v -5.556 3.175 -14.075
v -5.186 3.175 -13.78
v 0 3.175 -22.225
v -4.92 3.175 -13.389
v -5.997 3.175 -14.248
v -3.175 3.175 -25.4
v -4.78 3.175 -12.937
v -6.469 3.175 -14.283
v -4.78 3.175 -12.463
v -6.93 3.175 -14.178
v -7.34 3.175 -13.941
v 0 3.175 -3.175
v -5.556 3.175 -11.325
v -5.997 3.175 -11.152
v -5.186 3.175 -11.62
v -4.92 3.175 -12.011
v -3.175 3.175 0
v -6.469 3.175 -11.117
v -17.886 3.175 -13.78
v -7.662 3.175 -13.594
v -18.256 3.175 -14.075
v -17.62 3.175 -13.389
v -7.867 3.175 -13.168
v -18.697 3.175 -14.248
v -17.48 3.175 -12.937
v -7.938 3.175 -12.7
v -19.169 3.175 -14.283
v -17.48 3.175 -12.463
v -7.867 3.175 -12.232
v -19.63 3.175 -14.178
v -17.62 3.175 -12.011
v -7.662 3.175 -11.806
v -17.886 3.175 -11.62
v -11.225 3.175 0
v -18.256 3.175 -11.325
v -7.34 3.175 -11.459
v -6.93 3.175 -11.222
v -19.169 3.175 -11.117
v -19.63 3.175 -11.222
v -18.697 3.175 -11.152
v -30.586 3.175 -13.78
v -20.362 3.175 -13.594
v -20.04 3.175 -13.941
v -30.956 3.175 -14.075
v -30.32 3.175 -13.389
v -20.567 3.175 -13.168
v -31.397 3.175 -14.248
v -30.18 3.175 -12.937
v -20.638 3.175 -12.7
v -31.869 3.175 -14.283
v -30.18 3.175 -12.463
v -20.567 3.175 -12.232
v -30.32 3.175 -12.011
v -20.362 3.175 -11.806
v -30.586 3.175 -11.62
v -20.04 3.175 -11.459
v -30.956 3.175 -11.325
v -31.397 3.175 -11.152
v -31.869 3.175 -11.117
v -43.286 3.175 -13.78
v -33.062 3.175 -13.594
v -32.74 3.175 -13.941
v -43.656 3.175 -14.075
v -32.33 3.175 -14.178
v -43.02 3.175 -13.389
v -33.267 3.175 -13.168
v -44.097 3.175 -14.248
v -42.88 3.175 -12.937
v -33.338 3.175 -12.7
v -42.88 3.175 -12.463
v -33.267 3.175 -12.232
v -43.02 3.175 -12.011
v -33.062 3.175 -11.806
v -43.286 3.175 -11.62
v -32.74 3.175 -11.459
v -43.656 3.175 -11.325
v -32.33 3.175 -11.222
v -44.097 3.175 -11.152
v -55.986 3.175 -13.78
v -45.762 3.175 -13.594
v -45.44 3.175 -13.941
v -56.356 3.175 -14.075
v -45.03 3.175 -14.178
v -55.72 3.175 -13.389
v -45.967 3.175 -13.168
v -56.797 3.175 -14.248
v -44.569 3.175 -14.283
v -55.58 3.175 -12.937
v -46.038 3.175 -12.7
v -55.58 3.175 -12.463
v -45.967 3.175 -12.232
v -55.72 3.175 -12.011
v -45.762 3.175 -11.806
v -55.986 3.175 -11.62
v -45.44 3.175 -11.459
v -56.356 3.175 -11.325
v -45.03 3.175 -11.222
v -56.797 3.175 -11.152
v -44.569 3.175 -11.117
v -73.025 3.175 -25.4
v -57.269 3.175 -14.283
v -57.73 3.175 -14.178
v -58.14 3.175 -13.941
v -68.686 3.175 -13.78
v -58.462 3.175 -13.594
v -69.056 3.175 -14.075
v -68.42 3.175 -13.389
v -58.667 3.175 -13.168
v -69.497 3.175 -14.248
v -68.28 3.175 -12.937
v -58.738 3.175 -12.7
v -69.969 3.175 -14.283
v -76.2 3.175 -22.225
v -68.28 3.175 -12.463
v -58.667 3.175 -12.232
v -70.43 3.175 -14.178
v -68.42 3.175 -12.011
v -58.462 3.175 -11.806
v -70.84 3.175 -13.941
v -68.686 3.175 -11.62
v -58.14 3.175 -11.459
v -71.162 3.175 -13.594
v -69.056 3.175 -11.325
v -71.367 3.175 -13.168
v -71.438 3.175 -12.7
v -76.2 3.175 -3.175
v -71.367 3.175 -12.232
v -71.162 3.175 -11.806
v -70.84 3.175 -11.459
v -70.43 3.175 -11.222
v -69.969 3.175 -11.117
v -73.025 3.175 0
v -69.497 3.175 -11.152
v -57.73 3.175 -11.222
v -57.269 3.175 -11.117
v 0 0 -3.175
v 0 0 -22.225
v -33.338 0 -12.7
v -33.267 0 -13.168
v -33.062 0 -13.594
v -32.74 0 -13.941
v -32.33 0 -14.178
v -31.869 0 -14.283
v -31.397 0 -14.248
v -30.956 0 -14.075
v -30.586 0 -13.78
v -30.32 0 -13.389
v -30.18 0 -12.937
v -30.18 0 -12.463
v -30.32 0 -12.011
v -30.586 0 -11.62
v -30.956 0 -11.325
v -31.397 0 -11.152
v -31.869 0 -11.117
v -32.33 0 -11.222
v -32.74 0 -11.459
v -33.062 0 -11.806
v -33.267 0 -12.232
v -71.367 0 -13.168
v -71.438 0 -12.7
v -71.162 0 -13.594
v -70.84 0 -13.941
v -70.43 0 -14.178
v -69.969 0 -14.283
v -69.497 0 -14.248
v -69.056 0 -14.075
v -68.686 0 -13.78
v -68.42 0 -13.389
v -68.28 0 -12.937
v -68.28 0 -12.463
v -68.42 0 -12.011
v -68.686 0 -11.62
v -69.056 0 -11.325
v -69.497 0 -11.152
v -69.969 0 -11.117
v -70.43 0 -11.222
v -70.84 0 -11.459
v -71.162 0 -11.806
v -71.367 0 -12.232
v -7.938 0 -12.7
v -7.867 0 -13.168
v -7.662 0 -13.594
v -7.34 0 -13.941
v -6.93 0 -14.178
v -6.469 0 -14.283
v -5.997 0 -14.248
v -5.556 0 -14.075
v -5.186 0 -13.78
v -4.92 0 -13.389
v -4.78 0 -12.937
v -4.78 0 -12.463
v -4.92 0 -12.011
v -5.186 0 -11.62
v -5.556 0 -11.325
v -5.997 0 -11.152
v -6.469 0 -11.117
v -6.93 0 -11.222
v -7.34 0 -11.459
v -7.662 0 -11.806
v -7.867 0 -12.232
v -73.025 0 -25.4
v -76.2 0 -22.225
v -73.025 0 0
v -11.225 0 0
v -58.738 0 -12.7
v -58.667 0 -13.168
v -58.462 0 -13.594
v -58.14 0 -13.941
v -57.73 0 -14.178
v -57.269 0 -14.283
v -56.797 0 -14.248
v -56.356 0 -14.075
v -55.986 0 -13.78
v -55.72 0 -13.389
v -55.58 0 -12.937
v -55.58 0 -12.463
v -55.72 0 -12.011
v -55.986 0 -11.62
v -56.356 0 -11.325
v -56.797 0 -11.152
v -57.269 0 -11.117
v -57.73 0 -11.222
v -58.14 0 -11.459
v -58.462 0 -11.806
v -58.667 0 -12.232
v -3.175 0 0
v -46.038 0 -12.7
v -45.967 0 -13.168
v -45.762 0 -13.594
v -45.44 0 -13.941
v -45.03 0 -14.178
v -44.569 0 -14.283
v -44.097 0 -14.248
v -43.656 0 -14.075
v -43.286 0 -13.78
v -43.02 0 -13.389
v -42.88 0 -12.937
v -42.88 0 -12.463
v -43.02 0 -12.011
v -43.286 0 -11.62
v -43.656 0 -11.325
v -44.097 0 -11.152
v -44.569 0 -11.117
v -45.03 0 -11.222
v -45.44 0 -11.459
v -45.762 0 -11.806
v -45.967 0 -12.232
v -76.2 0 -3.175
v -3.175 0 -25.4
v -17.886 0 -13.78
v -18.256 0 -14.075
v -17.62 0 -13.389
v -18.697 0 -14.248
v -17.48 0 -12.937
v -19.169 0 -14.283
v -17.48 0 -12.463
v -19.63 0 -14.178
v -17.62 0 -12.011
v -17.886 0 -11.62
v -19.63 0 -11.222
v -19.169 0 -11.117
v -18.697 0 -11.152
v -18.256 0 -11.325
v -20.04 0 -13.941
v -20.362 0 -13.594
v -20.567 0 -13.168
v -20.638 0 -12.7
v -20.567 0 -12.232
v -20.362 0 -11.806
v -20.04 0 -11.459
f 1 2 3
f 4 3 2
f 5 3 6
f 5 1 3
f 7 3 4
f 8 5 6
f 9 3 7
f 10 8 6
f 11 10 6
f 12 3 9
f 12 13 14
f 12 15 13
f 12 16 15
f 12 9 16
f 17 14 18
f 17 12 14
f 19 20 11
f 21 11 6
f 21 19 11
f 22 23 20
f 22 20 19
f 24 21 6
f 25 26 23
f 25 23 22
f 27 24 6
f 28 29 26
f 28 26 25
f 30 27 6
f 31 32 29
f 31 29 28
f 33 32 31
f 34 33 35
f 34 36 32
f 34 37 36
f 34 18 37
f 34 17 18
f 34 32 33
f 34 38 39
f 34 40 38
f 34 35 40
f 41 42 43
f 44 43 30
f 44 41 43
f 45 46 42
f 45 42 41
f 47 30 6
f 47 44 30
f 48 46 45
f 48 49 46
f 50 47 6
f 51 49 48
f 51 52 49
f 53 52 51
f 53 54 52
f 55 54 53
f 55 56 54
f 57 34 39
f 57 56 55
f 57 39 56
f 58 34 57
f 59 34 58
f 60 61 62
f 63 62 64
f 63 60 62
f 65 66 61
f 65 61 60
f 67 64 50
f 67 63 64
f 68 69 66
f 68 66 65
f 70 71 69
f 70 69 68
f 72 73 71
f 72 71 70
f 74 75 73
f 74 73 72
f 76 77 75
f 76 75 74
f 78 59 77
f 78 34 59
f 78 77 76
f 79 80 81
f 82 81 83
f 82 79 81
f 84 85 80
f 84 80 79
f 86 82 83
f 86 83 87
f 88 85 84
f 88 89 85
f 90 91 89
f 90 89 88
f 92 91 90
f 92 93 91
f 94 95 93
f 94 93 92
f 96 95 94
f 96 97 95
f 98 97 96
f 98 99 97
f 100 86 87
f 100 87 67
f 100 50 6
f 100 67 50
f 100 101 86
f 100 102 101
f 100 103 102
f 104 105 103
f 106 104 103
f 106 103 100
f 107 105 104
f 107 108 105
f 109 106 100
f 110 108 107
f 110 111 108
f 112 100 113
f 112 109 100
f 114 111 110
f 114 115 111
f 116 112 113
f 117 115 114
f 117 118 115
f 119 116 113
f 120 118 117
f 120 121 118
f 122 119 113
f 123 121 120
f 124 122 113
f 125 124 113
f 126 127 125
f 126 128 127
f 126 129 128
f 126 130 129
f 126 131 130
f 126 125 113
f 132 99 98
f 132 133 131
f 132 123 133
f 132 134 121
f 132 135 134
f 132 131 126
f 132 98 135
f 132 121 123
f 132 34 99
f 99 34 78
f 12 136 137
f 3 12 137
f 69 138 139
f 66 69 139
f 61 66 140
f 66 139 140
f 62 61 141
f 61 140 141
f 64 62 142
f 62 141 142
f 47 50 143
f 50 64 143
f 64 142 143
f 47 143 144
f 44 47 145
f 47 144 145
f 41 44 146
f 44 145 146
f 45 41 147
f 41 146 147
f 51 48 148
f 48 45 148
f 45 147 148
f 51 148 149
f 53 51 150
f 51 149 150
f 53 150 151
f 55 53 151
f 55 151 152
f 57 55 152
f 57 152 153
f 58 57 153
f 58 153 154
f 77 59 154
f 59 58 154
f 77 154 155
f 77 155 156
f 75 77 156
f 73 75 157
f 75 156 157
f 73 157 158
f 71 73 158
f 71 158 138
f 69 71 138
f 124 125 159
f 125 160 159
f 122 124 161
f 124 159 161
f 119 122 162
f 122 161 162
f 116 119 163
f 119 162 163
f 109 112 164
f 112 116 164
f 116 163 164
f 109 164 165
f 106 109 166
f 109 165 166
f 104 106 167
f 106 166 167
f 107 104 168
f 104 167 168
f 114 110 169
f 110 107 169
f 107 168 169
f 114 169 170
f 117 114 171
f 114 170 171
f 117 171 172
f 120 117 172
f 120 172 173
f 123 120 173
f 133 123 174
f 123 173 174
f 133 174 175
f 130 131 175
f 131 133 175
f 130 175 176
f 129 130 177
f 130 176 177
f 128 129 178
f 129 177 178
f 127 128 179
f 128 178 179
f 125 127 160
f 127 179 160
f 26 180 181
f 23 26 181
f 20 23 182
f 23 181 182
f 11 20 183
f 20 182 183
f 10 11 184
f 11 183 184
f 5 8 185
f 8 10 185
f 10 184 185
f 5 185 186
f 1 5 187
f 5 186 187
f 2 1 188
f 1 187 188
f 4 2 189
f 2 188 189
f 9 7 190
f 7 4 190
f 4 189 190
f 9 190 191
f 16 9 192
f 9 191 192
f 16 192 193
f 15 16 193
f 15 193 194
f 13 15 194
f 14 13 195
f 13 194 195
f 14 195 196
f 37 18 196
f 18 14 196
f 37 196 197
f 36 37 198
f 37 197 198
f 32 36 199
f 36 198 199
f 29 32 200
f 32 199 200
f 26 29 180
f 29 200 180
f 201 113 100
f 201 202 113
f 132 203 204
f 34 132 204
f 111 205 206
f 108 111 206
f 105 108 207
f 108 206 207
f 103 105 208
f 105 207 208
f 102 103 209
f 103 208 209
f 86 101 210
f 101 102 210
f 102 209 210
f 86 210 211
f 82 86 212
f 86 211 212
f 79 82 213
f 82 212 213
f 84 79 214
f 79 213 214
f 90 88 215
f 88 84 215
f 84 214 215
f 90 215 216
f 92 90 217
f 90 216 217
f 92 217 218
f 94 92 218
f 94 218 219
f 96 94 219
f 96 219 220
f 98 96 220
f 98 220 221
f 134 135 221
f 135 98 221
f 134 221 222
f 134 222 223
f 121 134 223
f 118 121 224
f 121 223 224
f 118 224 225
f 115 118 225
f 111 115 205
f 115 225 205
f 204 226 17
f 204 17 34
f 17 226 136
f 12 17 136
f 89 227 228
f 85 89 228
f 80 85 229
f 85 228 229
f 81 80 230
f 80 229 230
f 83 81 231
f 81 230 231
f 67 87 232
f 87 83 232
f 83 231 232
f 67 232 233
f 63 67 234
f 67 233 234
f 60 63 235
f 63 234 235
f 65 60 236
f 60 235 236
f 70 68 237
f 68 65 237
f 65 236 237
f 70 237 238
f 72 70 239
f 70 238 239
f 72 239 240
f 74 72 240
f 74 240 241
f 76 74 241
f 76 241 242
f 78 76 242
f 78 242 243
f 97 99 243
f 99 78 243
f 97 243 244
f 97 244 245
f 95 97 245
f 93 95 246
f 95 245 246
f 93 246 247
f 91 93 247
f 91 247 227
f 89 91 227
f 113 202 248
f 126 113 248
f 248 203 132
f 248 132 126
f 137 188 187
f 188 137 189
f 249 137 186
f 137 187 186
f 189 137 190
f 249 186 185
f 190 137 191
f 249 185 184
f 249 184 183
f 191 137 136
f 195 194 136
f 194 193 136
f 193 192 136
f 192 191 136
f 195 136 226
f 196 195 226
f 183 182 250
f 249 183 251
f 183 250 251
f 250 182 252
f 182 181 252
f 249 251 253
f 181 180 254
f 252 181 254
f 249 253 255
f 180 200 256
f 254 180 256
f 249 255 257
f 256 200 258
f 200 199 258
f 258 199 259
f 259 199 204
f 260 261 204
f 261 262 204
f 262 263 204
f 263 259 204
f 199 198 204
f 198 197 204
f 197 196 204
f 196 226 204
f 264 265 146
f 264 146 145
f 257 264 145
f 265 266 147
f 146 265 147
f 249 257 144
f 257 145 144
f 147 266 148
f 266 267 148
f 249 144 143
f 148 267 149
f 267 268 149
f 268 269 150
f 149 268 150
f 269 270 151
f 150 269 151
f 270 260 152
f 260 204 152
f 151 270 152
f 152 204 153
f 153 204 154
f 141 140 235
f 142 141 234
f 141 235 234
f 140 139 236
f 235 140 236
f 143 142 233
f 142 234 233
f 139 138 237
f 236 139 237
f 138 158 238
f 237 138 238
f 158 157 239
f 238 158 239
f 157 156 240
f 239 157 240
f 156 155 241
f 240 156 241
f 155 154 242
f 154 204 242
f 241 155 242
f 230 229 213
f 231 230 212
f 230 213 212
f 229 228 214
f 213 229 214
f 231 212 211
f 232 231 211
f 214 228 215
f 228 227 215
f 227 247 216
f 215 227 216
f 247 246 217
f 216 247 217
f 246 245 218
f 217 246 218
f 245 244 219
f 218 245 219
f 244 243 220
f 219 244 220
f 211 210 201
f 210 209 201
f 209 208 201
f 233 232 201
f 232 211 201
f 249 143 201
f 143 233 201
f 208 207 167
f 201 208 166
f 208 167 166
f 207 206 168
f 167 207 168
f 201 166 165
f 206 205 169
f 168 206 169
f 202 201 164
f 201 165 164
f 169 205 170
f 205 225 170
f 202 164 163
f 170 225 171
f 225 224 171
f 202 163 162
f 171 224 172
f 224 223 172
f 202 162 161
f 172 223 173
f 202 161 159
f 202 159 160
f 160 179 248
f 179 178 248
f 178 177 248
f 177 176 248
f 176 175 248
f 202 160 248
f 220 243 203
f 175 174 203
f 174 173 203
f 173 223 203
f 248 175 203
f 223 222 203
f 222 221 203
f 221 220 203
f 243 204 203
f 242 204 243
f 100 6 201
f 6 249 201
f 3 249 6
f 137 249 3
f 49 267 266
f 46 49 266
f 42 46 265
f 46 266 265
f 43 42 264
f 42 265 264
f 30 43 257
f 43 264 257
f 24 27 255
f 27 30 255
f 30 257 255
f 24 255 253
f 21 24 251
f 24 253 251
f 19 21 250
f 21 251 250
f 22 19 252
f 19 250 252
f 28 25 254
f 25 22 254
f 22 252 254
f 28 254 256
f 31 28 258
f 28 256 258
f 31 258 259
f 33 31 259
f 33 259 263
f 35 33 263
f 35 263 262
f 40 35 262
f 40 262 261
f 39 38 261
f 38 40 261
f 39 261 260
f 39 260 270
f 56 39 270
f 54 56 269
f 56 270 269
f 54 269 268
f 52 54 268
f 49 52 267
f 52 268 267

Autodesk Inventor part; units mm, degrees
ref_plane "YZ Plane" through (0, 0, 0) normal (1, 0, 0) x (0, 1, 0)
ref_plane "XZ Plane" through (0, 0, 0) normal (0, 1, 0) x (-1, 0, 0)
ref_plane "XY Plane" through (0, 0, 0) normal (0, 0, 1) x (1, 0, 0)
sketch "Sketch1" plane through (0, 0, 0) normal (0, 1, 0) x (-1, 0, 0)
  line L0 (0, 0) -> (11.2251, 0)
  circle A0 centre (6.35, -12.7) radius 1.5875
  circle A1 centre (19.05, -12.7) radius 1.5875
  circle A2 centre (31.75, -12.7) radius 1.5875
  circle A3 centre (44.45, -12.7) radius 1.5875
  circle A4 centre (57.15, -12.7) radius 1.5875
  circle A5 centre (69.85, -12.7) radius 1.5875
  line L1 (0, 0) -> (0, -22.225)
  line L2 (3.175, -25.4) -> (73.025, -25.4)
  line L3 (76.2, -22.225) -> (76.2, -3.175)
  line L4 (73.025, 0) -> (11.2251, 0)
  line L5 (73.025, 0) -> (76.2, -3.175)
  line L6 (76.2, -22.225) -> (73.025, -25.4)
  line L7 (3.175, -25.4) -> (0, -22.225)
  line L8 (3.175, 0) -> (0, -3.175)
  point P0 (5.6126, 0)
  point P1 (0, -25.4)
  point P2 (76.2, -25.4)
  point P3 (76.2, 0)
  dimension "d0" = 3.175
  dimension "d2" = 12.7
  dimension "d5" = 12.7
  dimension "d10" = 25.4
  dimension "d11" = 6.35
  dimension "d12" = 3.175
  dimension "d13" = 3.175
  dimension "d14" = 3.175
  dimension "d15" = 3.175
  dimension "d16" = 3.175
  dimension "d17" = 3.175
extrude "Extrusion1" add sketch "Sketch1" along normal blind 3.175 contours L0 L4 L5 L3 L6 L2 L7 L1 L8
equation "\"d13\" = d12"
equation "\"d14\" = d12"
equation "\"d15\" = d14"
equation "\"d16\" = d12"
equation "\"d17\" = d16"
properties part number "Straight Bracket (6)"
